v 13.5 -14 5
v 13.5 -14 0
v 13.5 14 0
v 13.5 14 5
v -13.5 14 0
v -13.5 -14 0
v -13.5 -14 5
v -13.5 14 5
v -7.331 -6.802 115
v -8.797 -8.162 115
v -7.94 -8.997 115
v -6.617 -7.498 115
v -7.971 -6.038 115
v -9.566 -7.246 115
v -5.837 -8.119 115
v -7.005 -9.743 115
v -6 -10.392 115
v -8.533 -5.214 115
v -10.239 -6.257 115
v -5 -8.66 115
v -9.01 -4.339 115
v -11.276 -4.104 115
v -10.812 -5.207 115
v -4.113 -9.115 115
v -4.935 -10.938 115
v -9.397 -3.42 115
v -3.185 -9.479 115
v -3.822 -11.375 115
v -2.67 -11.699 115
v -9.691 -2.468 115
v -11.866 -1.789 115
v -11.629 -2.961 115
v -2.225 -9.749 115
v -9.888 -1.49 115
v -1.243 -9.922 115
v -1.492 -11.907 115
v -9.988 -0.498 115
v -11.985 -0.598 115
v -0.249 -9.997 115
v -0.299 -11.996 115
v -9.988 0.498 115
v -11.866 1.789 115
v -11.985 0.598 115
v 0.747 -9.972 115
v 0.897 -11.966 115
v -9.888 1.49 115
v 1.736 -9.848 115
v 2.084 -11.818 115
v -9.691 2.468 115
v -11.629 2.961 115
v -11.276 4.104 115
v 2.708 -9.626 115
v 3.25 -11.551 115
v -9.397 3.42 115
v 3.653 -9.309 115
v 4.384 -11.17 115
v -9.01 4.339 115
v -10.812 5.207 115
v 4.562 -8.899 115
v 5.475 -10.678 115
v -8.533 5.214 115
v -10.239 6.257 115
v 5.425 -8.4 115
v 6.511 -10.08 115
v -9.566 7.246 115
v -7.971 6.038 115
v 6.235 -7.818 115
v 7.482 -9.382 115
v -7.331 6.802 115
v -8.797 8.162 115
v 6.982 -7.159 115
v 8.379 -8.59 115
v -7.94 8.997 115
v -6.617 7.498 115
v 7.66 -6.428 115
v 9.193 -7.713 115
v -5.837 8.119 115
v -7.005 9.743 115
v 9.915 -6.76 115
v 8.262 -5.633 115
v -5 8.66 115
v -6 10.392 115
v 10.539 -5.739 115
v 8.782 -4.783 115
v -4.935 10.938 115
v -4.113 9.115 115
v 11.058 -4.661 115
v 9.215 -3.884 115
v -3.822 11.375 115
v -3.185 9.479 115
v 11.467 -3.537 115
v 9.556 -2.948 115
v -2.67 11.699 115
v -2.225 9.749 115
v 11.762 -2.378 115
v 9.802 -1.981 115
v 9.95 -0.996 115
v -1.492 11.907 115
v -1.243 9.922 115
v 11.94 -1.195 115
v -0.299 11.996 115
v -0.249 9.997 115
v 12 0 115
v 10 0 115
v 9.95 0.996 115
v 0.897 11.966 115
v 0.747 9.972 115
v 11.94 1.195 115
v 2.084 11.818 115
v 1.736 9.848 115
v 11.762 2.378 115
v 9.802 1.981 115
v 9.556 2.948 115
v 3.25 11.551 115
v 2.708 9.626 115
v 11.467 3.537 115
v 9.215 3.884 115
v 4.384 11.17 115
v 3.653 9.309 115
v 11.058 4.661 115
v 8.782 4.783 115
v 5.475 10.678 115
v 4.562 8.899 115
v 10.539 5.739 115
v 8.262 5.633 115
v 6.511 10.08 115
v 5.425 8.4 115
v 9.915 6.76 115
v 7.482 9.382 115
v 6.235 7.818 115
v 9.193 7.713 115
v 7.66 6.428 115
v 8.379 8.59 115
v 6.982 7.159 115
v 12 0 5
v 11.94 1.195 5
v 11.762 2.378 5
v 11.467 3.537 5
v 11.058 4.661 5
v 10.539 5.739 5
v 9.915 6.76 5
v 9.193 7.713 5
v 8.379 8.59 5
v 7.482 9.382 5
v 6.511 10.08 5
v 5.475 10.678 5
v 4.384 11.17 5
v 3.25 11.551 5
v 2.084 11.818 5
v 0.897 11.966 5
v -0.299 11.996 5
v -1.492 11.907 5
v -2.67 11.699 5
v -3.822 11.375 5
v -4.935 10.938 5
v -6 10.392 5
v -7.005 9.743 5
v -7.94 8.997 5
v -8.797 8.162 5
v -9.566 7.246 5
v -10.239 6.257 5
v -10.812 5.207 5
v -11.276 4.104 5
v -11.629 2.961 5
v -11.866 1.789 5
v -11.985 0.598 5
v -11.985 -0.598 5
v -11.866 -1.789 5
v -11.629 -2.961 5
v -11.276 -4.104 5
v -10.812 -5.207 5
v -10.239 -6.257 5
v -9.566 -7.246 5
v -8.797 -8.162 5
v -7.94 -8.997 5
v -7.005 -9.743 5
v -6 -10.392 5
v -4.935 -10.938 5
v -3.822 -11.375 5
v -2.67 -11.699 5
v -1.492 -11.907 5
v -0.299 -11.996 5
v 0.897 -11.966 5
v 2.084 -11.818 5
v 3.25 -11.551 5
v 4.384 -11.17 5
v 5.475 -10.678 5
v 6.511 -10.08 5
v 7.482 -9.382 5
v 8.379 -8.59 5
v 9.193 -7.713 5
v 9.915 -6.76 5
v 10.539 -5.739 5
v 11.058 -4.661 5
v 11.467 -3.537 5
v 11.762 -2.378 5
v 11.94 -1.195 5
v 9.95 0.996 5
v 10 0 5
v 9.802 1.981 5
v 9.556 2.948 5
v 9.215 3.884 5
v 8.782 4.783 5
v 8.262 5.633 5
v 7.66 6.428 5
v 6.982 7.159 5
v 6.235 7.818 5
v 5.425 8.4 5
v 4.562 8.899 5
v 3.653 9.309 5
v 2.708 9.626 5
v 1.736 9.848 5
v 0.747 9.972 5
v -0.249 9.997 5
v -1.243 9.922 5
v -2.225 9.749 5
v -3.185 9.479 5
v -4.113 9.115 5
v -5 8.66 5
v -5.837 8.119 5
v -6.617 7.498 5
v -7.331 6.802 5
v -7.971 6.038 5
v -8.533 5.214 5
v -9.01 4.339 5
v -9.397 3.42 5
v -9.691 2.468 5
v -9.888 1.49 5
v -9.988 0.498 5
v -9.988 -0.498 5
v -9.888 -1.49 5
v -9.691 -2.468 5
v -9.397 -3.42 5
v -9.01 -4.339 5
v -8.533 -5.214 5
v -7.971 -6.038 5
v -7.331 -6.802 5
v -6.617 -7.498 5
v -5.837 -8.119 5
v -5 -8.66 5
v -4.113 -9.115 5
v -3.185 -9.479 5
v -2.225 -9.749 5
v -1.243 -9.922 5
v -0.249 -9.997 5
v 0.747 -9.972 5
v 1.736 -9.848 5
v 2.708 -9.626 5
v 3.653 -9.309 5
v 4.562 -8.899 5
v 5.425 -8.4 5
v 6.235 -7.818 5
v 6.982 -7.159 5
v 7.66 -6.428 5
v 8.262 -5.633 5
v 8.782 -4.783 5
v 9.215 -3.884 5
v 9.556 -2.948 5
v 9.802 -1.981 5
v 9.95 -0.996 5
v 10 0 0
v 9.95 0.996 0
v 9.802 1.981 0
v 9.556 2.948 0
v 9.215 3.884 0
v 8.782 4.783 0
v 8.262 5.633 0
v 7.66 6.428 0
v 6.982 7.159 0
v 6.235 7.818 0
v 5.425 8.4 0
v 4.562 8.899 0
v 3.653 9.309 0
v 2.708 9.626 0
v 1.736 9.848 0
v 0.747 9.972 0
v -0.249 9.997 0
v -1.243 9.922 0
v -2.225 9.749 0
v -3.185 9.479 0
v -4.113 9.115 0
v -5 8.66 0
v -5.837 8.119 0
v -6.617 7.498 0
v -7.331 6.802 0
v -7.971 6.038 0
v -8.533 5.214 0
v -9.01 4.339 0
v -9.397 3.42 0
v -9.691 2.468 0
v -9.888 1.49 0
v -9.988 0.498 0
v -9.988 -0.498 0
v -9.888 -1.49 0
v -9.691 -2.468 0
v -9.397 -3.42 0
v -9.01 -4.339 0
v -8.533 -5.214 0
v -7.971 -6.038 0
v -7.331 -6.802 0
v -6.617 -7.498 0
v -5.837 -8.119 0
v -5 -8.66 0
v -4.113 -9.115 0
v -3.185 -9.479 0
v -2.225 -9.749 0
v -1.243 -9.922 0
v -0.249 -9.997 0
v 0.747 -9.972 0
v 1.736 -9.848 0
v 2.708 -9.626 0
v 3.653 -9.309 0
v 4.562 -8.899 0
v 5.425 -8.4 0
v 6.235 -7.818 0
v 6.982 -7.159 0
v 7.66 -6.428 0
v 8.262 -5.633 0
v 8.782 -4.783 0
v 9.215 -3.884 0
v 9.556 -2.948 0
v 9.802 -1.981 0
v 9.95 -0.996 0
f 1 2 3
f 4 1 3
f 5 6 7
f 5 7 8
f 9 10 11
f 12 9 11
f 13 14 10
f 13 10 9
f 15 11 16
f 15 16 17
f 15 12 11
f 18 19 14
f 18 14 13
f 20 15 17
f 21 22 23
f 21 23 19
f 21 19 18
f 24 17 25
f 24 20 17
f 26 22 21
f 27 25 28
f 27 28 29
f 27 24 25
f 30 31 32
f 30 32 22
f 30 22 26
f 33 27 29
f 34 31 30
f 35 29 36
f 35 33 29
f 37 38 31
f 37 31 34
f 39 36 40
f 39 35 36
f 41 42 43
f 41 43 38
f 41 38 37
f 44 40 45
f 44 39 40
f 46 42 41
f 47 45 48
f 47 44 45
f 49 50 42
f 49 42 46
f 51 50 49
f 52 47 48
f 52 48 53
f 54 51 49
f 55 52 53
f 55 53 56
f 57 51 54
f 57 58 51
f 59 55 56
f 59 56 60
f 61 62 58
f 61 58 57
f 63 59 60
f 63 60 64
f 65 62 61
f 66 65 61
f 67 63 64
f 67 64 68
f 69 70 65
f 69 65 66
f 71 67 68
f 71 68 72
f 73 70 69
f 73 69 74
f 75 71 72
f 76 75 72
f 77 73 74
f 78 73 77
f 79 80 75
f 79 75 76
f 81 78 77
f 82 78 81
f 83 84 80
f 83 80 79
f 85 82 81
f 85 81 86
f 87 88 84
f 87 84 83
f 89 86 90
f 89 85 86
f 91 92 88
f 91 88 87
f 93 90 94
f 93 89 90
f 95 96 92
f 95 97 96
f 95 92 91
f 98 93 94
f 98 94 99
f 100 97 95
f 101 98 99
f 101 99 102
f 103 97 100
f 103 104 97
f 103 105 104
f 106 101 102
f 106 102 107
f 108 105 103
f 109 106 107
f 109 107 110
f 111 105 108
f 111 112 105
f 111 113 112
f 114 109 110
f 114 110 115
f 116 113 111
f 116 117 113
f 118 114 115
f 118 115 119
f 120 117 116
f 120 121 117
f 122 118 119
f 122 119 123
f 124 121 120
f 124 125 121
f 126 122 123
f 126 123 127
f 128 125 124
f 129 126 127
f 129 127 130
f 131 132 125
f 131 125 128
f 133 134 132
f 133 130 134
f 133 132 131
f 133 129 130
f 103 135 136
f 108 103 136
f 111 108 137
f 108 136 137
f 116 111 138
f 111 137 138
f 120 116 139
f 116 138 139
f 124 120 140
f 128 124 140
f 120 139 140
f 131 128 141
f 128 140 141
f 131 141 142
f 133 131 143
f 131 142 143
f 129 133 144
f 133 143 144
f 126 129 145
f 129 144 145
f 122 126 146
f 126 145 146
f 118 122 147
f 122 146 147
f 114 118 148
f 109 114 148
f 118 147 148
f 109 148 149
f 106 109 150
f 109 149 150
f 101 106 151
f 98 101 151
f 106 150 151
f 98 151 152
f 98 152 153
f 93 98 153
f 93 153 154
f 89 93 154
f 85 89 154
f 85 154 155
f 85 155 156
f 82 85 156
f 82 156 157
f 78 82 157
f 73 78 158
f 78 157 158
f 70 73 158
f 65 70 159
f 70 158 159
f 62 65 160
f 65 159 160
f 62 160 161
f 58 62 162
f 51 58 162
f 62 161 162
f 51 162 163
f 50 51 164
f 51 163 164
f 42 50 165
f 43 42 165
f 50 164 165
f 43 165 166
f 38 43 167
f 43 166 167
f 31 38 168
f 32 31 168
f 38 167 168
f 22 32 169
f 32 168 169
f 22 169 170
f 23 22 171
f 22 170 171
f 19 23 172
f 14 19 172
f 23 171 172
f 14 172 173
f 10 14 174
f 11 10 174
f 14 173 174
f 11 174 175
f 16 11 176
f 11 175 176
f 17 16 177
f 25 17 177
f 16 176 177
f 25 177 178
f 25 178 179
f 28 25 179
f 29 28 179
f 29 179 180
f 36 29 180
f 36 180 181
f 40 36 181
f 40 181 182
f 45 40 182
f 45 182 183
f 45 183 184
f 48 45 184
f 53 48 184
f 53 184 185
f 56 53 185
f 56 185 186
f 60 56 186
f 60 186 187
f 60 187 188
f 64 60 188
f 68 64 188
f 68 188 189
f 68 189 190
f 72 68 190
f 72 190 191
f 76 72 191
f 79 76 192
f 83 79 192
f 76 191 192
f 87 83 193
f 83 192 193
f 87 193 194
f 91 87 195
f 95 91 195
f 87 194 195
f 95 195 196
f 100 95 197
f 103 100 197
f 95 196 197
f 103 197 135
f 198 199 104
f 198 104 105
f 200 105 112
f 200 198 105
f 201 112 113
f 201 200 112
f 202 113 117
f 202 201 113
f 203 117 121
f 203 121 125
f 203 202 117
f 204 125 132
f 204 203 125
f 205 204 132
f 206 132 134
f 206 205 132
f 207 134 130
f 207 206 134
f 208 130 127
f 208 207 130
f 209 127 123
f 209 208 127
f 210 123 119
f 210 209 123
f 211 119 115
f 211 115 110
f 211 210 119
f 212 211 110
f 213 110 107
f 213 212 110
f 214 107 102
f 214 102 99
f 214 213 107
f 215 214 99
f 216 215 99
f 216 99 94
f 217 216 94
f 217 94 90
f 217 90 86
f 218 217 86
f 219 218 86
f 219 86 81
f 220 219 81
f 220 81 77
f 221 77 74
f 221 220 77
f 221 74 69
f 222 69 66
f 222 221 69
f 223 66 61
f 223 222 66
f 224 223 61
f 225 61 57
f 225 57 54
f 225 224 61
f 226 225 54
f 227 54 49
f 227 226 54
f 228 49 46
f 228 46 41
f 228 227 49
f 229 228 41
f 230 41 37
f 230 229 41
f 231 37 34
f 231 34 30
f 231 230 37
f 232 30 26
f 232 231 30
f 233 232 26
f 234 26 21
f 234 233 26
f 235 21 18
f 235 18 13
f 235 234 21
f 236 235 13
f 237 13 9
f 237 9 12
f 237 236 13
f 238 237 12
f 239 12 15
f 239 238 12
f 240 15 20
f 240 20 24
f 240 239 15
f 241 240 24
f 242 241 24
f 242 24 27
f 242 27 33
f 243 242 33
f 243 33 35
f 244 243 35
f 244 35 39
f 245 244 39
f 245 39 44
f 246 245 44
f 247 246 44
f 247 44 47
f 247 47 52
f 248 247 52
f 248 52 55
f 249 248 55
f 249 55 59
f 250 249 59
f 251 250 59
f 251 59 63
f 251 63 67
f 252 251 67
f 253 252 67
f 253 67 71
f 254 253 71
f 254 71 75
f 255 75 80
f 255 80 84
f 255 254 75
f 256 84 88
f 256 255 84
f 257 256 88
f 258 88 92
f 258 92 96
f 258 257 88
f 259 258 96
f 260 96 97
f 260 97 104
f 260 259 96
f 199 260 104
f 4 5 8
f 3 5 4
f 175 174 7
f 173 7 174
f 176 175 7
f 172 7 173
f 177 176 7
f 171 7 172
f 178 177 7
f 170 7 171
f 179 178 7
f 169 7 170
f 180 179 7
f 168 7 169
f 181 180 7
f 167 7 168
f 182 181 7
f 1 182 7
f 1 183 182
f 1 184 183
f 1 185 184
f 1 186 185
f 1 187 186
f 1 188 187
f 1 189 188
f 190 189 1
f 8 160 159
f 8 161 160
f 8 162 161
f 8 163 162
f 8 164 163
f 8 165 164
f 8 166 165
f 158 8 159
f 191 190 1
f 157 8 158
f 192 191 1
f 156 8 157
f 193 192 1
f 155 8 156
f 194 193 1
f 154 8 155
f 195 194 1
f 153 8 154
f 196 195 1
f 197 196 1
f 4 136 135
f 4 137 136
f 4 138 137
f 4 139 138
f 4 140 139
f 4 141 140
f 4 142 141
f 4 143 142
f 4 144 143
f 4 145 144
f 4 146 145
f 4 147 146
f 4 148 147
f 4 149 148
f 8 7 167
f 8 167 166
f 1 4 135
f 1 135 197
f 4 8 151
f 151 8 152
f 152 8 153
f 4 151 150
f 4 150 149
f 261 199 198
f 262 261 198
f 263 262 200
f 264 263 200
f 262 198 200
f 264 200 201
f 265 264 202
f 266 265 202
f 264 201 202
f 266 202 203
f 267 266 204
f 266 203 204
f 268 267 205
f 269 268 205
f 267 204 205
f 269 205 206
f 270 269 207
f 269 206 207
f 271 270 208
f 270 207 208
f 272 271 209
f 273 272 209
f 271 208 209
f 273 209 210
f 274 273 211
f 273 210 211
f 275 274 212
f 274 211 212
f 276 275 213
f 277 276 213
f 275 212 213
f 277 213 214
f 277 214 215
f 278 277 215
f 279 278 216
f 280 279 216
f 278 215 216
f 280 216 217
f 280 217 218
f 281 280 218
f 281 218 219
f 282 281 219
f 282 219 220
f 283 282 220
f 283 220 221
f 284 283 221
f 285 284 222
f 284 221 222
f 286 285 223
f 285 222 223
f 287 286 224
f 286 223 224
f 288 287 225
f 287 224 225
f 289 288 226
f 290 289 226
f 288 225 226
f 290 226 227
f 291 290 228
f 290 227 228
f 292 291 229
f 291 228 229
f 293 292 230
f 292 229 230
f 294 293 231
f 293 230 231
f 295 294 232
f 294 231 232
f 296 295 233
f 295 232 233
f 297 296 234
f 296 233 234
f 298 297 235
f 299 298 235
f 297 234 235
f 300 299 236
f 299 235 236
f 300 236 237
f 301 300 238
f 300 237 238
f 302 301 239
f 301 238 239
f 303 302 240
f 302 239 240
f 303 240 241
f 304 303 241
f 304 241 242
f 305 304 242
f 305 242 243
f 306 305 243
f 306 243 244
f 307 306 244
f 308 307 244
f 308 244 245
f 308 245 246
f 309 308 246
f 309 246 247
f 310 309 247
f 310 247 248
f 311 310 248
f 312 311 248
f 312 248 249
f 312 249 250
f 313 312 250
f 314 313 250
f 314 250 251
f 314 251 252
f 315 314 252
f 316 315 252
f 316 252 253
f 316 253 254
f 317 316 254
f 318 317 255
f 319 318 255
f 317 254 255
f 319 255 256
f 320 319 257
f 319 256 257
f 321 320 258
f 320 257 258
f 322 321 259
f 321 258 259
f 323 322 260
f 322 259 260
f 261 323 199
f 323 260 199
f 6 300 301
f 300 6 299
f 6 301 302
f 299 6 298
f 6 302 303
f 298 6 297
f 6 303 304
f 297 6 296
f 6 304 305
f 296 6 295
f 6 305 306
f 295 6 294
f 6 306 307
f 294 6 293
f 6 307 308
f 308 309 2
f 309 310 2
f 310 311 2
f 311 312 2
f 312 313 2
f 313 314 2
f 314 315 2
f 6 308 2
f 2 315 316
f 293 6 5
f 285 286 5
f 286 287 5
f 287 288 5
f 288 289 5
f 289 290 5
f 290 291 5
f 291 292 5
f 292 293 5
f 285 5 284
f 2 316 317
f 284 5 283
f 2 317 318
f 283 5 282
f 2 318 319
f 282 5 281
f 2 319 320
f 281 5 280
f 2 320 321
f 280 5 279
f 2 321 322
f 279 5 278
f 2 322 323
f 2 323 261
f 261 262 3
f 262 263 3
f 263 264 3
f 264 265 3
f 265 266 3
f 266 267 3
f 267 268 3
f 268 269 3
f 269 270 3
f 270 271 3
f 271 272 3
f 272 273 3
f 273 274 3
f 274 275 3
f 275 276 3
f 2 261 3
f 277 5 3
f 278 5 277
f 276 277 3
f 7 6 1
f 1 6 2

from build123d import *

# Parameters (mm, degrees)
F0_W      = 27
F0_H      = 28
F1_DEPTH  = 5
F2_R      = 12
F2_R_2    = 10
F3_DEPTH  = 110
F3_FACE_R = 10
F4_DEPTH  = 5


with BuildPart() as f1:
    # F0 (on Top) → F1 (new body)
    with BuildSketch(Plane.XY):
        Rectangle(F0_W, F0_H)
    extrude(amount=F1_DEPTH)

    # F2 (on face) → F3 (join)
    with BuildSketch(Plane.XY.offset(5)):
        Circle(F2_R)
        Circle(F2_R_2, mode=Mode.SUBTRACT)
    extrude(amount=F3_DEPTH)

    # F3_face (on face) → F4 (cut, through all)
    with BuildSketch(Plane.XY.offset(5)):
        Circle(F3_FACE_R)
    extrude(amount=-F4_DEPTH, mode=Mode.SUBTRACT)


solid = f1.part
